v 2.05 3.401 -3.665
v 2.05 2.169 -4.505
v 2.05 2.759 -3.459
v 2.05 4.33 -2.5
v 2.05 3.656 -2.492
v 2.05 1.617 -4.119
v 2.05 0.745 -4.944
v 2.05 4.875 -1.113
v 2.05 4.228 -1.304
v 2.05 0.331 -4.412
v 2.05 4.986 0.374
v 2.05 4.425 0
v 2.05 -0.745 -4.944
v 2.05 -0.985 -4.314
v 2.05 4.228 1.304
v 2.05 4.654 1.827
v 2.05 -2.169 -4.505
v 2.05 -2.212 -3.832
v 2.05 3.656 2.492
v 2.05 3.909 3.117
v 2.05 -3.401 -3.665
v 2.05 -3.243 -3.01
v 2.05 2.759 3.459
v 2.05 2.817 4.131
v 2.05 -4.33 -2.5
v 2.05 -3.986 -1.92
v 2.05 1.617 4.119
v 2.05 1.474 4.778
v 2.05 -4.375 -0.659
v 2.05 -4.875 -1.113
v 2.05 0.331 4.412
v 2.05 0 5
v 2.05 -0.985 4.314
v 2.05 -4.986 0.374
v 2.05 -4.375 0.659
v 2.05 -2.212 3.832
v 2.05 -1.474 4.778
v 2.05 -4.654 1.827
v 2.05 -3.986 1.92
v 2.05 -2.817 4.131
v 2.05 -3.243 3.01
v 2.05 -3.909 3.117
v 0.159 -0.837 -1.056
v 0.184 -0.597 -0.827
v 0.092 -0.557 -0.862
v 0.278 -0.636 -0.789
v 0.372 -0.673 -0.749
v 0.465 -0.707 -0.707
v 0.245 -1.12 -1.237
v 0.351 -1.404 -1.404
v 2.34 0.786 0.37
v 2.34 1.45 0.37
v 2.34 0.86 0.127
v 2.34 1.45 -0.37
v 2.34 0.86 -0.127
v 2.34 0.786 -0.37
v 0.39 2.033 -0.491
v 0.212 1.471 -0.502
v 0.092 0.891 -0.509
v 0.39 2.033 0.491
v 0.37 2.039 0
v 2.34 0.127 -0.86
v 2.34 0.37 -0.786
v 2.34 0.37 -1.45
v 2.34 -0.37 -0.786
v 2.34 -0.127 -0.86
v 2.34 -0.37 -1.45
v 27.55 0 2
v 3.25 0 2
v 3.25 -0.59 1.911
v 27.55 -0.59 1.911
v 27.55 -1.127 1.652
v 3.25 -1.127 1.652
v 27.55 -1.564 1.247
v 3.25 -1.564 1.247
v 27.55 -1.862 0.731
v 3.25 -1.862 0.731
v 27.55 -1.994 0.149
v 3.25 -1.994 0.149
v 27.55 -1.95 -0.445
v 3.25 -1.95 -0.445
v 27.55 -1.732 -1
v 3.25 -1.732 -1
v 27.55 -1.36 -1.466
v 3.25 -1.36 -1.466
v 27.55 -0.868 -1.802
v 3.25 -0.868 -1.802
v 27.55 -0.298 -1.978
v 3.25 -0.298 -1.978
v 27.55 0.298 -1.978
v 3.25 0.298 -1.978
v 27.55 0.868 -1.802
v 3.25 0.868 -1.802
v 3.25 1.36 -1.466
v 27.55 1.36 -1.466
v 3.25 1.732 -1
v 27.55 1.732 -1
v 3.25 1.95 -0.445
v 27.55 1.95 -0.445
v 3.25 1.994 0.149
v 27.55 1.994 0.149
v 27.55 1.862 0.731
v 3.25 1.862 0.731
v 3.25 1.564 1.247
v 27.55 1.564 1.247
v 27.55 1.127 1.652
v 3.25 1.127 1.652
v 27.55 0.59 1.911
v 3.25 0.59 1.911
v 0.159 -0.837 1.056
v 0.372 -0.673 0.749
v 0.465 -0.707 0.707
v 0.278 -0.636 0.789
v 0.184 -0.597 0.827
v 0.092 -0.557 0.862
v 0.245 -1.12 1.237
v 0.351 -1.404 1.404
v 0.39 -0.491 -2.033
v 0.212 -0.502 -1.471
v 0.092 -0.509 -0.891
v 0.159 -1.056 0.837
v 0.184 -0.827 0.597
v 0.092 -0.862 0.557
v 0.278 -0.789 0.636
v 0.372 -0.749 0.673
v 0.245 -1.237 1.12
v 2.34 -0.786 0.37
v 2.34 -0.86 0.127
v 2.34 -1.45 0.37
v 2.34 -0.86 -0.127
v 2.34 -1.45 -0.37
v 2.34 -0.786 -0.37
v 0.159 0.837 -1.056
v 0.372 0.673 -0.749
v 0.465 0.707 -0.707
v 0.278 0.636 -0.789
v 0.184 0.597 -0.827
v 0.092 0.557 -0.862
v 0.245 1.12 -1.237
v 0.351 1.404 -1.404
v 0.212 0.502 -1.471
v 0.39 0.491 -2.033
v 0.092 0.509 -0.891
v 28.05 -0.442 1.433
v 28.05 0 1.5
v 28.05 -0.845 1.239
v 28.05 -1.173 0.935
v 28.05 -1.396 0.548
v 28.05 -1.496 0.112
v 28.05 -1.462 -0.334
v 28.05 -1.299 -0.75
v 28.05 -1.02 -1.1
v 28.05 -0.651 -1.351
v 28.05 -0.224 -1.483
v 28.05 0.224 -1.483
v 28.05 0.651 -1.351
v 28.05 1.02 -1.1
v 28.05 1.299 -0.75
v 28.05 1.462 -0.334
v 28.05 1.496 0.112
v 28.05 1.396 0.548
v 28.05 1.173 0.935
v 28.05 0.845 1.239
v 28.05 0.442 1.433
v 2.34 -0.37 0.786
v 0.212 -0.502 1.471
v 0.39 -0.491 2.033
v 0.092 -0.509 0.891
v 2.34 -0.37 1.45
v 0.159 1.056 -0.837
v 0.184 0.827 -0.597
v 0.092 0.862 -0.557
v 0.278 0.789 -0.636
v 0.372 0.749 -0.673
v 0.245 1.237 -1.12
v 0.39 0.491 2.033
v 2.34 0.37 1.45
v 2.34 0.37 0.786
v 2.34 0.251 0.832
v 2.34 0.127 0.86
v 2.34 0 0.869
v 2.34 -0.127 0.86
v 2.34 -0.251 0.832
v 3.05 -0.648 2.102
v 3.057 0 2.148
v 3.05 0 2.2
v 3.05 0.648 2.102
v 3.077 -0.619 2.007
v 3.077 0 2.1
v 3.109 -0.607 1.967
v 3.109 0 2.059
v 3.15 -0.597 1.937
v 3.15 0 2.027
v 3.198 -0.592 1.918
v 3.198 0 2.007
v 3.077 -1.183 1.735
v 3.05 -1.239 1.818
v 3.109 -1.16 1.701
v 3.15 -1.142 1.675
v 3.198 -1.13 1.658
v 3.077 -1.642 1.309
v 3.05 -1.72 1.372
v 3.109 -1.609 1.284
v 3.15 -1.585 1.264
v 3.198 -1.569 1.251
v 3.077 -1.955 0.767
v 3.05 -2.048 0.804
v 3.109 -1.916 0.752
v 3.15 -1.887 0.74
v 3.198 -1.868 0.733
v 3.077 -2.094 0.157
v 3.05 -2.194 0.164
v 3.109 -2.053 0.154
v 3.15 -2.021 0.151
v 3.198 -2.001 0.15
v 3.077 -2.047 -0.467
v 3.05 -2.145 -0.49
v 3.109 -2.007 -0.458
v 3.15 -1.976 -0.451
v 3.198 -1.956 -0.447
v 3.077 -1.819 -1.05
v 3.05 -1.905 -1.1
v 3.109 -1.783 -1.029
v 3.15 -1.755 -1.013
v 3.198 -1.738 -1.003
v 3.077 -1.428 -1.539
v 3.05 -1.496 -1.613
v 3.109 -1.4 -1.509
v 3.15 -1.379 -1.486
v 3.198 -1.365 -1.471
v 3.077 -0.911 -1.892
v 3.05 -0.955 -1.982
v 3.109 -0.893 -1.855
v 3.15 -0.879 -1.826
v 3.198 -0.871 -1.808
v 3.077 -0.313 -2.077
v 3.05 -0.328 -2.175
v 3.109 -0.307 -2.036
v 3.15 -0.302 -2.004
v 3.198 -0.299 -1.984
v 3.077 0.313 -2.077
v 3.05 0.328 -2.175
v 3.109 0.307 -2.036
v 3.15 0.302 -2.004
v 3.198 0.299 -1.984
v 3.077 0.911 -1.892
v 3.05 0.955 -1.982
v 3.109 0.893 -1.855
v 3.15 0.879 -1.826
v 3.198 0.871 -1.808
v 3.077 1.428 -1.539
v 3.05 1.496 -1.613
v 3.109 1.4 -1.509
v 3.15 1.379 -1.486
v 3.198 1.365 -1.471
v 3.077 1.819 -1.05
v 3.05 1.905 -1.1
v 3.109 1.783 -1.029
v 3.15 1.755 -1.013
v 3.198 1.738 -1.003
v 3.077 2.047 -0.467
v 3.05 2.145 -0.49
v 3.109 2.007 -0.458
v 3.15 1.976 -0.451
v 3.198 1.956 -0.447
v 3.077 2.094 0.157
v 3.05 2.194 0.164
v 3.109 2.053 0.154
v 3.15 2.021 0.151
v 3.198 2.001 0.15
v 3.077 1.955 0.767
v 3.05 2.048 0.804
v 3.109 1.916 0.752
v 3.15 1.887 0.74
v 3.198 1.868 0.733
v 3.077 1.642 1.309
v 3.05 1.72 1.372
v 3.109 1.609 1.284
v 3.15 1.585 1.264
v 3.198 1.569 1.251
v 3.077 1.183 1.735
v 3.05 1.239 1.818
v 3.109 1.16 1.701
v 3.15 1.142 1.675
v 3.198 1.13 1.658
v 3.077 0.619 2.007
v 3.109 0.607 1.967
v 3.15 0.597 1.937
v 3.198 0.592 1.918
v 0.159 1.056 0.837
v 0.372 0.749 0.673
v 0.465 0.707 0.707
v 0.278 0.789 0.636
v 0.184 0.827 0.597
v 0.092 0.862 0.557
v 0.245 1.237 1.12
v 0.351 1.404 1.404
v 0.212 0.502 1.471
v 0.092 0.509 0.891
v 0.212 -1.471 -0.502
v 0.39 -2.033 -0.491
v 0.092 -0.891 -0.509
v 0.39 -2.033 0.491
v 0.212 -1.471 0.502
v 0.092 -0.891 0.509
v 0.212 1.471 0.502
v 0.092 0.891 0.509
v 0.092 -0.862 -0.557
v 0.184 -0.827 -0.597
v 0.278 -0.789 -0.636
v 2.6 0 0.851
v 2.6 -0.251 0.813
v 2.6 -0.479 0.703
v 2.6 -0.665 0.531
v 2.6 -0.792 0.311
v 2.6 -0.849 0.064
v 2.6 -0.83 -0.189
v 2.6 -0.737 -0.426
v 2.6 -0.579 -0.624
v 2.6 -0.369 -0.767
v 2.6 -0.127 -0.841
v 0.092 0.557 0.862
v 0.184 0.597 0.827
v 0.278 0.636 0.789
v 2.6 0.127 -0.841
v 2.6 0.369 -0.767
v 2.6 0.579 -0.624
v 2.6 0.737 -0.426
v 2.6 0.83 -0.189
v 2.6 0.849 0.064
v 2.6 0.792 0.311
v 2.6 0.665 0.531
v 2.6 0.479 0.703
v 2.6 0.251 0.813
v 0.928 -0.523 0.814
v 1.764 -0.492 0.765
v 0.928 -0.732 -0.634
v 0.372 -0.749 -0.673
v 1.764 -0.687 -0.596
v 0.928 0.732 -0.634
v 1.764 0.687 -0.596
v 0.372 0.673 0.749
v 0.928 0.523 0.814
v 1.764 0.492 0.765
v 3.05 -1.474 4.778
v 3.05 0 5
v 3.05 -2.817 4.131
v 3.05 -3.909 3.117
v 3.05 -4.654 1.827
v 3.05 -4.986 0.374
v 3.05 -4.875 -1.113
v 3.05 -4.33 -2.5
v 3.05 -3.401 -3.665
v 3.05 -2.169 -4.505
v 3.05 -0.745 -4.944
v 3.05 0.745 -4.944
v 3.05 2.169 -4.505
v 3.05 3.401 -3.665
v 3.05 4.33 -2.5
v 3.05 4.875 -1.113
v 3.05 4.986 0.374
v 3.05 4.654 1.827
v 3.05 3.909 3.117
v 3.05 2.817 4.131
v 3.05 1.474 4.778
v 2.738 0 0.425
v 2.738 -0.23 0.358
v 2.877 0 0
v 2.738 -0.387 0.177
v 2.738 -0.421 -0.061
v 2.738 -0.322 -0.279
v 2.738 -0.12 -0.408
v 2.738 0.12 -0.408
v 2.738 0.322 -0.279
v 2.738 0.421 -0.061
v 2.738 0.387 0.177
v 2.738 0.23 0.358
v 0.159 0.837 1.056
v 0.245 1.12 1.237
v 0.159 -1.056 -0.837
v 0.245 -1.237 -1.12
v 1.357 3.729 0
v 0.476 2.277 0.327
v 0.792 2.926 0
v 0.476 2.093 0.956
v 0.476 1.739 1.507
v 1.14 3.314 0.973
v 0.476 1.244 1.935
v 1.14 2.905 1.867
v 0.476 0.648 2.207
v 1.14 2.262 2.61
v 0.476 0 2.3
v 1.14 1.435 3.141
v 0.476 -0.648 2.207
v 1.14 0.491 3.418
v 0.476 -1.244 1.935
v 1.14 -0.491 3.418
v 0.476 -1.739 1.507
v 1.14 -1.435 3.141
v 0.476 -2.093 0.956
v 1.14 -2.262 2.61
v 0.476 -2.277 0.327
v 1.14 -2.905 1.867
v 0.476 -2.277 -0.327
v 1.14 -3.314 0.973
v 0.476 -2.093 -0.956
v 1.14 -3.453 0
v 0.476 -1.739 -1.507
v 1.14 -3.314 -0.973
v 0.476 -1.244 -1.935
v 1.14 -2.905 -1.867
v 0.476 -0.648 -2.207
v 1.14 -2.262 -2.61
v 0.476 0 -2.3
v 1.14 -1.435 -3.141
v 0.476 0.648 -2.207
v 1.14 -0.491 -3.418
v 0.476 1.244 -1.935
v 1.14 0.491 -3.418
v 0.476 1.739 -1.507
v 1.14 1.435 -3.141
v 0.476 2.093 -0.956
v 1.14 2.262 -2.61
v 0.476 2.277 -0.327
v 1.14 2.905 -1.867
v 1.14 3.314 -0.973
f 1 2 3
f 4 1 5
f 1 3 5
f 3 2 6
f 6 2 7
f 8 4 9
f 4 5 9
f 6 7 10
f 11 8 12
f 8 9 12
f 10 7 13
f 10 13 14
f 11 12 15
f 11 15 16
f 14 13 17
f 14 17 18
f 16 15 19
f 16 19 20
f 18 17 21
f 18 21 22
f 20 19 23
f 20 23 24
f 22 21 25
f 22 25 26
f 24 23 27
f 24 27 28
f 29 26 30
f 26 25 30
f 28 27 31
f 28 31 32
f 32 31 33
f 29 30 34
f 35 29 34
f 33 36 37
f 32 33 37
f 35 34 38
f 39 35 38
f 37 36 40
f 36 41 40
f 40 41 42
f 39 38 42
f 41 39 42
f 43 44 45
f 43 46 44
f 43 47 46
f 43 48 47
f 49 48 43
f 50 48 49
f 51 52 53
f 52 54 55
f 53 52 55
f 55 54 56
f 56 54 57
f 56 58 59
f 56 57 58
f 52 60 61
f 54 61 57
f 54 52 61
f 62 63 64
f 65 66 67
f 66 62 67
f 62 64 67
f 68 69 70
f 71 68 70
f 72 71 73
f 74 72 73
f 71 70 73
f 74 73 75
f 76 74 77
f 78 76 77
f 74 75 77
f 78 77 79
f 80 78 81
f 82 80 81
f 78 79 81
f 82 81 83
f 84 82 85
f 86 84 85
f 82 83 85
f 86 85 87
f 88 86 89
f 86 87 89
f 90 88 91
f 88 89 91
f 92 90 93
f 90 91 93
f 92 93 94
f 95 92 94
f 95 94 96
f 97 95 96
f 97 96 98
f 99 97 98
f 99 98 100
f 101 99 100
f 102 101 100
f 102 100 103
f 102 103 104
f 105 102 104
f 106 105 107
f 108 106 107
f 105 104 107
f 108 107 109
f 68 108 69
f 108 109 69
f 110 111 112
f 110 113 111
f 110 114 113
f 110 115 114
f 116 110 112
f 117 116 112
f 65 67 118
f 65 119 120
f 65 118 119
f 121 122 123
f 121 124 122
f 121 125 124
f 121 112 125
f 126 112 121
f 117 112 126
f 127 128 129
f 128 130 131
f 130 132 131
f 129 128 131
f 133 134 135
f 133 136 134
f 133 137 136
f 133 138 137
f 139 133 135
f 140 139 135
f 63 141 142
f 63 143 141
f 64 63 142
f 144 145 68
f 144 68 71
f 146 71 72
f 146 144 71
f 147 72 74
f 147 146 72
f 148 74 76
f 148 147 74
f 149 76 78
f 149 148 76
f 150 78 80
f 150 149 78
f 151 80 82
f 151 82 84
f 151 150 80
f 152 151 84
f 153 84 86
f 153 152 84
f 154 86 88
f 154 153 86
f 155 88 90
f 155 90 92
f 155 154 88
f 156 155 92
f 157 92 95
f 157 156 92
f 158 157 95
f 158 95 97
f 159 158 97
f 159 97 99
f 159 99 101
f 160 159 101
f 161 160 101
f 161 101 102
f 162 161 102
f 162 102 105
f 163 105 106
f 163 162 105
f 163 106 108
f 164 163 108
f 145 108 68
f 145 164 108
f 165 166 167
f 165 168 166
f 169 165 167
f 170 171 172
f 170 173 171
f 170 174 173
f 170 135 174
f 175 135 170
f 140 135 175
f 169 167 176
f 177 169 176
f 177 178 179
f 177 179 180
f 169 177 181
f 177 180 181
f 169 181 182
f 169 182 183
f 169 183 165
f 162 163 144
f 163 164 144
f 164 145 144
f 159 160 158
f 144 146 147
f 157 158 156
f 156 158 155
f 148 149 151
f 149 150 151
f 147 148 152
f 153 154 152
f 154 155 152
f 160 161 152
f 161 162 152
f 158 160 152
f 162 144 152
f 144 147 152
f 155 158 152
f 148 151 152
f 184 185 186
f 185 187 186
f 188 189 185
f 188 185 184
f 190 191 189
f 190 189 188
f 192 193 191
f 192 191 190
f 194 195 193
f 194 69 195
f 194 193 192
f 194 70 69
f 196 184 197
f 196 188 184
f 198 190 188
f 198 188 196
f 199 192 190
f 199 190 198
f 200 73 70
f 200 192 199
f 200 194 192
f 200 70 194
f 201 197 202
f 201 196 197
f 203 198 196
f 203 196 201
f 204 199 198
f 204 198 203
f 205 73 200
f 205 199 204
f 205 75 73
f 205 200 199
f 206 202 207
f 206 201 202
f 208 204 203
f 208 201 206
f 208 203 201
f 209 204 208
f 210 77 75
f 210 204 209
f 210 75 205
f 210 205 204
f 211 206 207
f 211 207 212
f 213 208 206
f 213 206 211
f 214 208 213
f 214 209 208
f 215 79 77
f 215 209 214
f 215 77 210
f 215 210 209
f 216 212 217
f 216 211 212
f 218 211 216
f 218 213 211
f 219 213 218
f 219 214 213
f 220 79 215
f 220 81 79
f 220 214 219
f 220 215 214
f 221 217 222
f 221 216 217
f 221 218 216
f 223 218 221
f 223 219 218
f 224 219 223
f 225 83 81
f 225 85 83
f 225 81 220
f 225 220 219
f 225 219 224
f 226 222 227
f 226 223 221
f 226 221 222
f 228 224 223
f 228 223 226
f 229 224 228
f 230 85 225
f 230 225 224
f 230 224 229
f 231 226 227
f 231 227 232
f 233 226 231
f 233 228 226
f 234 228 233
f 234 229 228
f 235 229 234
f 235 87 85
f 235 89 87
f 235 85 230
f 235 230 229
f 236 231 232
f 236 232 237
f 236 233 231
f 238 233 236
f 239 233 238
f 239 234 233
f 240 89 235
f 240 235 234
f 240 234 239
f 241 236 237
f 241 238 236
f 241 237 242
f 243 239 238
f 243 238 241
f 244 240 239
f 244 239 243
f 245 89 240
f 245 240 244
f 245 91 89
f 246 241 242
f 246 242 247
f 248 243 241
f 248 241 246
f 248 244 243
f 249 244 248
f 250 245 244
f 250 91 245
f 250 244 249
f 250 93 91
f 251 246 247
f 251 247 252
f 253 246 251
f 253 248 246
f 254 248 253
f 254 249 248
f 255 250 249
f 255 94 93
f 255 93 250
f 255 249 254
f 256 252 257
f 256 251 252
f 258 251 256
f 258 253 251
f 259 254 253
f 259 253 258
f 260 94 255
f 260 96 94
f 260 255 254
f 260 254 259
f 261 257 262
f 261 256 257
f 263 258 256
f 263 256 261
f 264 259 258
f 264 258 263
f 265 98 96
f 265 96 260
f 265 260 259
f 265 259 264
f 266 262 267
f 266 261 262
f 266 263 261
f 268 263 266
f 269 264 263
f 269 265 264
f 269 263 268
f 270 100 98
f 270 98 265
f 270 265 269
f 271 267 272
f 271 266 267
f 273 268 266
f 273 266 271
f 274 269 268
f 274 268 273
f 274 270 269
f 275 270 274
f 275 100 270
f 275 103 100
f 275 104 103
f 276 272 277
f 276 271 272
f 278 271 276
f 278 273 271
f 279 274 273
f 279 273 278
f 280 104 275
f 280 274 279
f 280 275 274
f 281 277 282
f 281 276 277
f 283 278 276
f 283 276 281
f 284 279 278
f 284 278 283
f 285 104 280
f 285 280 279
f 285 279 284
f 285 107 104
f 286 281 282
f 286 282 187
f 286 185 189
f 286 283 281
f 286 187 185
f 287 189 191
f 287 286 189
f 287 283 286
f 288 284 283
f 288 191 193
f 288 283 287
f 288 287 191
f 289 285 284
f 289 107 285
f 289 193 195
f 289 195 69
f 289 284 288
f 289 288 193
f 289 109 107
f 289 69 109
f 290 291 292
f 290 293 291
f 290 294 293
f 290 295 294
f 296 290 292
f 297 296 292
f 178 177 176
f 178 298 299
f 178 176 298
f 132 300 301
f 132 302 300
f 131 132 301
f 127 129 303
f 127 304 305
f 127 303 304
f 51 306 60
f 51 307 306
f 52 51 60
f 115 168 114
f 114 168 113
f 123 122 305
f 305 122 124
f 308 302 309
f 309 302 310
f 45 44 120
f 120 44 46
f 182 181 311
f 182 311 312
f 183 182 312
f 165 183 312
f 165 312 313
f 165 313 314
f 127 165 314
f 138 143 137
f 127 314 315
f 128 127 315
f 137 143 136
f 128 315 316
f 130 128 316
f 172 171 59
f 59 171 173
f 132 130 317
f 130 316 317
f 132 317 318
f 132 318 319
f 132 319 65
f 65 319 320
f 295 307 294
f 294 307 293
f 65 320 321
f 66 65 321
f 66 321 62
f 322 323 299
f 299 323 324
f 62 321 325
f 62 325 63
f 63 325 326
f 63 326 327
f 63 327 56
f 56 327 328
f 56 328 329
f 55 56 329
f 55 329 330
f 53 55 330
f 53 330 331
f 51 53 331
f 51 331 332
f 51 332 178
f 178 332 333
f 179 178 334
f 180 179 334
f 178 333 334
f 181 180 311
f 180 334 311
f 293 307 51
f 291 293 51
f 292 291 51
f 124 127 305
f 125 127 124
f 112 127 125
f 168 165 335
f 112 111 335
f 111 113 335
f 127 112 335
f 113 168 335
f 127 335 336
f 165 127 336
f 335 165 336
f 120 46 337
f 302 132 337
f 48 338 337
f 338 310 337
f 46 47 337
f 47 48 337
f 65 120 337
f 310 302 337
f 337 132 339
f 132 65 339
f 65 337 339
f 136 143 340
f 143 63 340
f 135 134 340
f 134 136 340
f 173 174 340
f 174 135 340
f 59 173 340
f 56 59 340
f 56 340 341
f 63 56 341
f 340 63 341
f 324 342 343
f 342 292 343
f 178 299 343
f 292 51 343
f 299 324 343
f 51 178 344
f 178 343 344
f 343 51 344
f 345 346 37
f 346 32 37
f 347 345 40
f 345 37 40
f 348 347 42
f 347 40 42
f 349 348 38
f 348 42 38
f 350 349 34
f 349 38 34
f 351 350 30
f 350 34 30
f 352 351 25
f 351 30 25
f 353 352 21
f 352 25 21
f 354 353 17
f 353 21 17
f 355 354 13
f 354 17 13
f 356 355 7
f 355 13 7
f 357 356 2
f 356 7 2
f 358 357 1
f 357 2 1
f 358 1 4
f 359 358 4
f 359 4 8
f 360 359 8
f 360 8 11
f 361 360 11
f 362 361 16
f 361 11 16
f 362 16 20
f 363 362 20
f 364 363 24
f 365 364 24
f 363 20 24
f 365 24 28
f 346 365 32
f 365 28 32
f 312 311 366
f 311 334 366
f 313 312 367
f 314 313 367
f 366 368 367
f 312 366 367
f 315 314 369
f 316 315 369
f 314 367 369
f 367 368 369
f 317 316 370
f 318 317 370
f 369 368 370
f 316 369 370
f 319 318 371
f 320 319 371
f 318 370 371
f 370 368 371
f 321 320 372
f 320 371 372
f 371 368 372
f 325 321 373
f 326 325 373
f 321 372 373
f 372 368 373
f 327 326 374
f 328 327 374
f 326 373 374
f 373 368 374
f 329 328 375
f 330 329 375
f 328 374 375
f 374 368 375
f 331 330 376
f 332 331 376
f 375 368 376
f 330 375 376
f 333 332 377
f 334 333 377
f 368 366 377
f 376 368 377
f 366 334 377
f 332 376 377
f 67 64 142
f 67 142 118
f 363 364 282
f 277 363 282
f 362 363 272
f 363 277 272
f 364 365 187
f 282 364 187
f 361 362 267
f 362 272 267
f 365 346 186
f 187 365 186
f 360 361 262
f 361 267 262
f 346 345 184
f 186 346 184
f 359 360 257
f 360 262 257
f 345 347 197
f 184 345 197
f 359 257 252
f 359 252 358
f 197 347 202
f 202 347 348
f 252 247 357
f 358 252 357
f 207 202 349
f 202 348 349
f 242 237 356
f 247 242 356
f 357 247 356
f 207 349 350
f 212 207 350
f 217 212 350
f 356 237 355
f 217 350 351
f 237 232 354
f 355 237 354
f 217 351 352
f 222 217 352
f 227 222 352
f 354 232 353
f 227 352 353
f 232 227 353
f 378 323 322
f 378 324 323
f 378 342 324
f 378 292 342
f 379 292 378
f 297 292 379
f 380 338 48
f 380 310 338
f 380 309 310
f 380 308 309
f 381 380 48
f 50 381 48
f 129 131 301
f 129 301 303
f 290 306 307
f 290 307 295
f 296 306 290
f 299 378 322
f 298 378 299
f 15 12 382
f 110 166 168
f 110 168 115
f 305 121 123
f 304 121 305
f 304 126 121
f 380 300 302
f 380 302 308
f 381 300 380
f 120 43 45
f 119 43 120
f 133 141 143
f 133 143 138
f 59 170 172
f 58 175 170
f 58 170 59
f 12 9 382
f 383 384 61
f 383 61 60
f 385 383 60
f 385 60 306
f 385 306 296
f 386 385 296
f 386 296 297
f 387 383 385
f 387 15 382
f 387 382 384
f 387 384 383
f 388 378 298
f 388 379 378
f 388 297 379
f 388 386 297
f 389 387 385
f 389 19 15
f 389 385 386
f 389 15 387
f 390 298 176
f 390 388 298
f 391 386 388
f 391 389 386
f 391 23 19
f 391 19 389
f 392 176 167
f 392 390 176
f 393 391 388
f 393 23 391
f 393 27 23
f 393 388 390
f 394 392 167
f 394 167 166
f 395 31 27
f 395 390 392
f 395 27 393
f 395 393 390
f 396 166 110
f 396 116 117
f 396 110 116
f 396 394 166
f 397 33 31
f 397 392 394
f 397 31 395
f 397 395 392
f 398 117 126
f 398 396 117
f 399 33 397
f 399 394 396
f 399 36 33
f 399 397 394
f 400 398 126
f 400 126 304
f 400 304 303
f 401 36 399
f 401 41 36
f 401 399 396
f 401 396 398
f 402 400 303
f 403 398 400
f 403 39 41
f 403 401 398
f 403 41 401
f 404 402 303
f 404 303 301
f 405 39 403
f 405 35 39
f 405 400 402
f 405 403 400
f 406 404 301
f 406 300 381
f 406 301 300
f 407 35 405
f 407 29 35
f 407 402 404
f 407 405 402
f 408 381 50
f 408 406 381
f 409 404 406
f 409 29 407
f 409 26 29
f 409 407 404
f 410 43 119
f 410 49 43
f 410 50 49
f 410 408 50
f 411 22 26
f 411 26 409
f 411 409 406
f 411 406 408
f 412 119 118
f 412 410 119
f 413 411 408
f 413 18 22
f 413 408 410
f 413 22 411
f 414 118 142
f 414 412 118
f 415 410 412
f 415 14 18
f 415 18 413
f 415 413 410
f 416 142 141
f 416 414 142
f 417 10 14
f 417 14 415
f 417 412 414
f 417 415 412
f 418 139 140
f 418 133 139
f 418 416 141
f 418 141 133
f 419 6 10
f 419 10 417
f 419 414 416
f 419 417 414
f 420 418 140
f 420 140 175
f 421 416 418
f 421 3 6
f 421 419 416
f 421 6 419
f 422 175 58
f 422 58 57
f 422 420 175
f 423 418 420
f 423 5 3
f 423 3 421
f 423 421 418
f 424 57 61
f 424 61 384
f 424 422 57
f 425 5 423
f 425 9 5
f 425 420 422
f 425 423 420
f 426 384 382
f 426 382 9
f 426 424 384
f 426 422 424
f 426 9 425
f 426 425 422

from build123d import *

# Parameters (mm, degrees)
FILLET1_R             = 0.2
RECPAT_COUNT          = 2
RECPAT_ANGLE          = 90
CHAMFER_1_SIZE        = 0.5
CUT_EXTRUDE_START     = -1.932317225
CUT_EXTRUDE_1_DEPTH   = 0.992538955
CUT_EXTRUDE_1_2_DEPTH = 0.992538955
CUT_EXTRUDE_1_3_DEPTH = 0.992538955
CUT_EXTRUDE_1_4_DEPTH = 0.992538955


# Read off the part's stored shape, not the designer's step: Вытянуть1
with BuildPart() as part:
    # BodySke → Base-Revolve (revolve)
    with BuildSketch(Plane.XY, mode=Mode.PRIVATE) as base_revolve_sk:
        Polygon((3.05, 2), (3.05, 5), (2.05, 5), (2.05, 0), (28.05, 0), (28.05, 2), align=None)
    revolve(base_revolve_sk.sketch.rotate(Axis((-6.35, 0, 0), (1, 0, 0)), 90), axis=Axis((-6.35, 0, 0), (1, 0, 0)))

    # Fillet1
    fillet1_edges = [part.edges().sort_by_distance(p)[0] for p in [
        (3.05, 0, -2),
    ]]
    fillet(fillet1_edges, radius=FILLET1_R)

    # PanSke → Pan (revolve)
    with BuildSketch(Plane.XY):
        with BuildLine():
            Line((2.05, 4.424646879), (2.05, 0))
            Line((2.05, 0), (0, 0))
            ThreePointArc((0, 0), (0.537396082, 2.438237068), (2.05, 4.424646879))
        make_face()
    revolve(axis=Axis((0, 0, 0), (1, 0, 0)))

    # Sketch3 → Recess section 0
    with BuildSketch(Plane(origin=(0, 0, 0), x_dir=(0, 0, -1), z_dir=(1, 0, 0))):
        with BuildLine():
            Line((-0.515, 2.15), (0.515, 2.15))
            Line((0.515, 2.15), (0.515, -2.15))
            Line((0.515, -2.15), (-0.515, -2.15))
            Line((-0.515, -2.15), (-0.515, 2.15))
        make_face()
    # Sketch4 → Recess section 1
    with BuildSketch(Plane(origin=(2.34, 0, 0), x_dir=(0, 0, -1), z_dir=(1, 0, 0))):
        with BuildLine():
            Line((-0.37, 1.45), (0.37, 1.45))
            Line((0.37, 1.45), (0.37, -1.45))
            Line((0.37, -1.45), (-0.37, -1.45))
            Line((-0.37, -1.45), (-0.37, 1.45))
        make_face()
    recess = loft(mode=Mode.SUBTRACT)

    # RecPat: Recess ×2 about axis
    recpat_axis = Axis((0, 0, 0), (1, 0, 0))
    for i in range(1, RECPAT_COUNT):
        add(recess.rotate(recpat_axis, i * RECPAT_ANGLE / (RECPAT_COUNT - 1)), mode=Mode.SUBTRACT)

    # RecCorSke → RecessCore (revolve, cut)
    with BuildSketch(Plane.XY, mode=Mode.PRIVATE) as recesscore_sk:
        Polygon((0, 0), (0, 1.032809711), (2.6, 0.851), (2.876506661, 0), align=None)
    revolve(recesscore_sk.sketch.rotate(Axis((-3.175, 0, 0), (1, 0, 0)), 90), axis=Axis((-3.175, 0, 0), (1, 0, 0)), mode=Mode.SUBTRACT)

    # Фаска1
    chamfer_1_edges = [part.edges().sort_by_distance(p)[0] for p in [
        (28.05, 0, -2),
    ]]
    chamfer(chamfer_1_edges, length=CHAMFER_1_SIZE)

    # Вытянуть1 outline → Вытянуть1 (cut)
    with BuildSketch(Plane(origin=(0, 0, 0), x_dir=(0.9932989193126689, -0.08172287590474318, -0.08172287590474292), z_dir=(0.11557359946062105, 0.7023684015912586, 0.7023684015912564)).offset(CUT_EXTRUDE_START)):
        Polygon((-1, -0.919204654), (0.206895578, -0.216114133), (0.577867997, 0), (0.206895578, 0.216114133), (-1, 0.919204654), align=None)
    extrude(amount=CUT_EXTRUDE_1_DEPTH, mode=Mode.SUBTRACT)

    # Cut-Extrude 1 2 outline → Cut-Extrude 1 2 (cut)
    with BuildSketch(Plane(origin=(0, 0, 0), x_dir=(0.9932989193126689, -0.08172287590474318, 0.08172287590474292), z_dir=(0.11557359946062105, 0.7023684015912586, -0.7023684015912564)).offset(CUT_EXTRUDE_START)):
        Polygon((0.206895578, -0.216114133), (0.577867997, 0), (0.206895578, 0.216114133), (-1, 0.919204654), (-1, -0.919204654), align=None)
    extrude(amount=CUT_EXTRUDE_1_2_DEPTH, mode=Mode.SUBTRACT)

    # Cut-Extrude 1 3 outline → Cut-Extrude 1 3 (cut)
    with BuildSketch(Plane(origin=(0, 0, 0), x_dir=(0.9932989193126689, 0.08172287590474318, 0.08172287590474292), z_dir=(0.11557359946062105, -0.7023684015912586, -0.7023684015912564)).offset(CUT_EXTRUDE_START)):
        Polygon((0.206895578, -0.216114133), (0.577867997, 0), (0.206895578, 0.216114133), (-1, 0.919204654), (-1, -0.919204654), align=None)
    extrude(amount=CUT_EXTRUDE_1_3_DEPTH, mode=Mode.SUBTRACT)

    # Cut-Extrude 1 4 outline → Cut-Extrude 1 4 (cut)
    with BuildSketch(Plane(origin=(0, 0, 0), x_dir=(0.9932989193126689, 0.08172287590474318, -0.08172287590474292), z_dir=(0.11557359946062105, -0.7023684015912586, 0.7023684015912564)).offset(CUT_EXTRUDE_START)):
        Polygon((-1, -0.919204654), (0.206895578, -0.216114133), (0.577867997, 0), (0.206895578, 0.216114133), (-1, 0.919204654), align=None)
    extrude(amount=CUT_EXTRUDE_1_4_DEPTH, mode=Mode.SUBTRACT)


solid = part.part
